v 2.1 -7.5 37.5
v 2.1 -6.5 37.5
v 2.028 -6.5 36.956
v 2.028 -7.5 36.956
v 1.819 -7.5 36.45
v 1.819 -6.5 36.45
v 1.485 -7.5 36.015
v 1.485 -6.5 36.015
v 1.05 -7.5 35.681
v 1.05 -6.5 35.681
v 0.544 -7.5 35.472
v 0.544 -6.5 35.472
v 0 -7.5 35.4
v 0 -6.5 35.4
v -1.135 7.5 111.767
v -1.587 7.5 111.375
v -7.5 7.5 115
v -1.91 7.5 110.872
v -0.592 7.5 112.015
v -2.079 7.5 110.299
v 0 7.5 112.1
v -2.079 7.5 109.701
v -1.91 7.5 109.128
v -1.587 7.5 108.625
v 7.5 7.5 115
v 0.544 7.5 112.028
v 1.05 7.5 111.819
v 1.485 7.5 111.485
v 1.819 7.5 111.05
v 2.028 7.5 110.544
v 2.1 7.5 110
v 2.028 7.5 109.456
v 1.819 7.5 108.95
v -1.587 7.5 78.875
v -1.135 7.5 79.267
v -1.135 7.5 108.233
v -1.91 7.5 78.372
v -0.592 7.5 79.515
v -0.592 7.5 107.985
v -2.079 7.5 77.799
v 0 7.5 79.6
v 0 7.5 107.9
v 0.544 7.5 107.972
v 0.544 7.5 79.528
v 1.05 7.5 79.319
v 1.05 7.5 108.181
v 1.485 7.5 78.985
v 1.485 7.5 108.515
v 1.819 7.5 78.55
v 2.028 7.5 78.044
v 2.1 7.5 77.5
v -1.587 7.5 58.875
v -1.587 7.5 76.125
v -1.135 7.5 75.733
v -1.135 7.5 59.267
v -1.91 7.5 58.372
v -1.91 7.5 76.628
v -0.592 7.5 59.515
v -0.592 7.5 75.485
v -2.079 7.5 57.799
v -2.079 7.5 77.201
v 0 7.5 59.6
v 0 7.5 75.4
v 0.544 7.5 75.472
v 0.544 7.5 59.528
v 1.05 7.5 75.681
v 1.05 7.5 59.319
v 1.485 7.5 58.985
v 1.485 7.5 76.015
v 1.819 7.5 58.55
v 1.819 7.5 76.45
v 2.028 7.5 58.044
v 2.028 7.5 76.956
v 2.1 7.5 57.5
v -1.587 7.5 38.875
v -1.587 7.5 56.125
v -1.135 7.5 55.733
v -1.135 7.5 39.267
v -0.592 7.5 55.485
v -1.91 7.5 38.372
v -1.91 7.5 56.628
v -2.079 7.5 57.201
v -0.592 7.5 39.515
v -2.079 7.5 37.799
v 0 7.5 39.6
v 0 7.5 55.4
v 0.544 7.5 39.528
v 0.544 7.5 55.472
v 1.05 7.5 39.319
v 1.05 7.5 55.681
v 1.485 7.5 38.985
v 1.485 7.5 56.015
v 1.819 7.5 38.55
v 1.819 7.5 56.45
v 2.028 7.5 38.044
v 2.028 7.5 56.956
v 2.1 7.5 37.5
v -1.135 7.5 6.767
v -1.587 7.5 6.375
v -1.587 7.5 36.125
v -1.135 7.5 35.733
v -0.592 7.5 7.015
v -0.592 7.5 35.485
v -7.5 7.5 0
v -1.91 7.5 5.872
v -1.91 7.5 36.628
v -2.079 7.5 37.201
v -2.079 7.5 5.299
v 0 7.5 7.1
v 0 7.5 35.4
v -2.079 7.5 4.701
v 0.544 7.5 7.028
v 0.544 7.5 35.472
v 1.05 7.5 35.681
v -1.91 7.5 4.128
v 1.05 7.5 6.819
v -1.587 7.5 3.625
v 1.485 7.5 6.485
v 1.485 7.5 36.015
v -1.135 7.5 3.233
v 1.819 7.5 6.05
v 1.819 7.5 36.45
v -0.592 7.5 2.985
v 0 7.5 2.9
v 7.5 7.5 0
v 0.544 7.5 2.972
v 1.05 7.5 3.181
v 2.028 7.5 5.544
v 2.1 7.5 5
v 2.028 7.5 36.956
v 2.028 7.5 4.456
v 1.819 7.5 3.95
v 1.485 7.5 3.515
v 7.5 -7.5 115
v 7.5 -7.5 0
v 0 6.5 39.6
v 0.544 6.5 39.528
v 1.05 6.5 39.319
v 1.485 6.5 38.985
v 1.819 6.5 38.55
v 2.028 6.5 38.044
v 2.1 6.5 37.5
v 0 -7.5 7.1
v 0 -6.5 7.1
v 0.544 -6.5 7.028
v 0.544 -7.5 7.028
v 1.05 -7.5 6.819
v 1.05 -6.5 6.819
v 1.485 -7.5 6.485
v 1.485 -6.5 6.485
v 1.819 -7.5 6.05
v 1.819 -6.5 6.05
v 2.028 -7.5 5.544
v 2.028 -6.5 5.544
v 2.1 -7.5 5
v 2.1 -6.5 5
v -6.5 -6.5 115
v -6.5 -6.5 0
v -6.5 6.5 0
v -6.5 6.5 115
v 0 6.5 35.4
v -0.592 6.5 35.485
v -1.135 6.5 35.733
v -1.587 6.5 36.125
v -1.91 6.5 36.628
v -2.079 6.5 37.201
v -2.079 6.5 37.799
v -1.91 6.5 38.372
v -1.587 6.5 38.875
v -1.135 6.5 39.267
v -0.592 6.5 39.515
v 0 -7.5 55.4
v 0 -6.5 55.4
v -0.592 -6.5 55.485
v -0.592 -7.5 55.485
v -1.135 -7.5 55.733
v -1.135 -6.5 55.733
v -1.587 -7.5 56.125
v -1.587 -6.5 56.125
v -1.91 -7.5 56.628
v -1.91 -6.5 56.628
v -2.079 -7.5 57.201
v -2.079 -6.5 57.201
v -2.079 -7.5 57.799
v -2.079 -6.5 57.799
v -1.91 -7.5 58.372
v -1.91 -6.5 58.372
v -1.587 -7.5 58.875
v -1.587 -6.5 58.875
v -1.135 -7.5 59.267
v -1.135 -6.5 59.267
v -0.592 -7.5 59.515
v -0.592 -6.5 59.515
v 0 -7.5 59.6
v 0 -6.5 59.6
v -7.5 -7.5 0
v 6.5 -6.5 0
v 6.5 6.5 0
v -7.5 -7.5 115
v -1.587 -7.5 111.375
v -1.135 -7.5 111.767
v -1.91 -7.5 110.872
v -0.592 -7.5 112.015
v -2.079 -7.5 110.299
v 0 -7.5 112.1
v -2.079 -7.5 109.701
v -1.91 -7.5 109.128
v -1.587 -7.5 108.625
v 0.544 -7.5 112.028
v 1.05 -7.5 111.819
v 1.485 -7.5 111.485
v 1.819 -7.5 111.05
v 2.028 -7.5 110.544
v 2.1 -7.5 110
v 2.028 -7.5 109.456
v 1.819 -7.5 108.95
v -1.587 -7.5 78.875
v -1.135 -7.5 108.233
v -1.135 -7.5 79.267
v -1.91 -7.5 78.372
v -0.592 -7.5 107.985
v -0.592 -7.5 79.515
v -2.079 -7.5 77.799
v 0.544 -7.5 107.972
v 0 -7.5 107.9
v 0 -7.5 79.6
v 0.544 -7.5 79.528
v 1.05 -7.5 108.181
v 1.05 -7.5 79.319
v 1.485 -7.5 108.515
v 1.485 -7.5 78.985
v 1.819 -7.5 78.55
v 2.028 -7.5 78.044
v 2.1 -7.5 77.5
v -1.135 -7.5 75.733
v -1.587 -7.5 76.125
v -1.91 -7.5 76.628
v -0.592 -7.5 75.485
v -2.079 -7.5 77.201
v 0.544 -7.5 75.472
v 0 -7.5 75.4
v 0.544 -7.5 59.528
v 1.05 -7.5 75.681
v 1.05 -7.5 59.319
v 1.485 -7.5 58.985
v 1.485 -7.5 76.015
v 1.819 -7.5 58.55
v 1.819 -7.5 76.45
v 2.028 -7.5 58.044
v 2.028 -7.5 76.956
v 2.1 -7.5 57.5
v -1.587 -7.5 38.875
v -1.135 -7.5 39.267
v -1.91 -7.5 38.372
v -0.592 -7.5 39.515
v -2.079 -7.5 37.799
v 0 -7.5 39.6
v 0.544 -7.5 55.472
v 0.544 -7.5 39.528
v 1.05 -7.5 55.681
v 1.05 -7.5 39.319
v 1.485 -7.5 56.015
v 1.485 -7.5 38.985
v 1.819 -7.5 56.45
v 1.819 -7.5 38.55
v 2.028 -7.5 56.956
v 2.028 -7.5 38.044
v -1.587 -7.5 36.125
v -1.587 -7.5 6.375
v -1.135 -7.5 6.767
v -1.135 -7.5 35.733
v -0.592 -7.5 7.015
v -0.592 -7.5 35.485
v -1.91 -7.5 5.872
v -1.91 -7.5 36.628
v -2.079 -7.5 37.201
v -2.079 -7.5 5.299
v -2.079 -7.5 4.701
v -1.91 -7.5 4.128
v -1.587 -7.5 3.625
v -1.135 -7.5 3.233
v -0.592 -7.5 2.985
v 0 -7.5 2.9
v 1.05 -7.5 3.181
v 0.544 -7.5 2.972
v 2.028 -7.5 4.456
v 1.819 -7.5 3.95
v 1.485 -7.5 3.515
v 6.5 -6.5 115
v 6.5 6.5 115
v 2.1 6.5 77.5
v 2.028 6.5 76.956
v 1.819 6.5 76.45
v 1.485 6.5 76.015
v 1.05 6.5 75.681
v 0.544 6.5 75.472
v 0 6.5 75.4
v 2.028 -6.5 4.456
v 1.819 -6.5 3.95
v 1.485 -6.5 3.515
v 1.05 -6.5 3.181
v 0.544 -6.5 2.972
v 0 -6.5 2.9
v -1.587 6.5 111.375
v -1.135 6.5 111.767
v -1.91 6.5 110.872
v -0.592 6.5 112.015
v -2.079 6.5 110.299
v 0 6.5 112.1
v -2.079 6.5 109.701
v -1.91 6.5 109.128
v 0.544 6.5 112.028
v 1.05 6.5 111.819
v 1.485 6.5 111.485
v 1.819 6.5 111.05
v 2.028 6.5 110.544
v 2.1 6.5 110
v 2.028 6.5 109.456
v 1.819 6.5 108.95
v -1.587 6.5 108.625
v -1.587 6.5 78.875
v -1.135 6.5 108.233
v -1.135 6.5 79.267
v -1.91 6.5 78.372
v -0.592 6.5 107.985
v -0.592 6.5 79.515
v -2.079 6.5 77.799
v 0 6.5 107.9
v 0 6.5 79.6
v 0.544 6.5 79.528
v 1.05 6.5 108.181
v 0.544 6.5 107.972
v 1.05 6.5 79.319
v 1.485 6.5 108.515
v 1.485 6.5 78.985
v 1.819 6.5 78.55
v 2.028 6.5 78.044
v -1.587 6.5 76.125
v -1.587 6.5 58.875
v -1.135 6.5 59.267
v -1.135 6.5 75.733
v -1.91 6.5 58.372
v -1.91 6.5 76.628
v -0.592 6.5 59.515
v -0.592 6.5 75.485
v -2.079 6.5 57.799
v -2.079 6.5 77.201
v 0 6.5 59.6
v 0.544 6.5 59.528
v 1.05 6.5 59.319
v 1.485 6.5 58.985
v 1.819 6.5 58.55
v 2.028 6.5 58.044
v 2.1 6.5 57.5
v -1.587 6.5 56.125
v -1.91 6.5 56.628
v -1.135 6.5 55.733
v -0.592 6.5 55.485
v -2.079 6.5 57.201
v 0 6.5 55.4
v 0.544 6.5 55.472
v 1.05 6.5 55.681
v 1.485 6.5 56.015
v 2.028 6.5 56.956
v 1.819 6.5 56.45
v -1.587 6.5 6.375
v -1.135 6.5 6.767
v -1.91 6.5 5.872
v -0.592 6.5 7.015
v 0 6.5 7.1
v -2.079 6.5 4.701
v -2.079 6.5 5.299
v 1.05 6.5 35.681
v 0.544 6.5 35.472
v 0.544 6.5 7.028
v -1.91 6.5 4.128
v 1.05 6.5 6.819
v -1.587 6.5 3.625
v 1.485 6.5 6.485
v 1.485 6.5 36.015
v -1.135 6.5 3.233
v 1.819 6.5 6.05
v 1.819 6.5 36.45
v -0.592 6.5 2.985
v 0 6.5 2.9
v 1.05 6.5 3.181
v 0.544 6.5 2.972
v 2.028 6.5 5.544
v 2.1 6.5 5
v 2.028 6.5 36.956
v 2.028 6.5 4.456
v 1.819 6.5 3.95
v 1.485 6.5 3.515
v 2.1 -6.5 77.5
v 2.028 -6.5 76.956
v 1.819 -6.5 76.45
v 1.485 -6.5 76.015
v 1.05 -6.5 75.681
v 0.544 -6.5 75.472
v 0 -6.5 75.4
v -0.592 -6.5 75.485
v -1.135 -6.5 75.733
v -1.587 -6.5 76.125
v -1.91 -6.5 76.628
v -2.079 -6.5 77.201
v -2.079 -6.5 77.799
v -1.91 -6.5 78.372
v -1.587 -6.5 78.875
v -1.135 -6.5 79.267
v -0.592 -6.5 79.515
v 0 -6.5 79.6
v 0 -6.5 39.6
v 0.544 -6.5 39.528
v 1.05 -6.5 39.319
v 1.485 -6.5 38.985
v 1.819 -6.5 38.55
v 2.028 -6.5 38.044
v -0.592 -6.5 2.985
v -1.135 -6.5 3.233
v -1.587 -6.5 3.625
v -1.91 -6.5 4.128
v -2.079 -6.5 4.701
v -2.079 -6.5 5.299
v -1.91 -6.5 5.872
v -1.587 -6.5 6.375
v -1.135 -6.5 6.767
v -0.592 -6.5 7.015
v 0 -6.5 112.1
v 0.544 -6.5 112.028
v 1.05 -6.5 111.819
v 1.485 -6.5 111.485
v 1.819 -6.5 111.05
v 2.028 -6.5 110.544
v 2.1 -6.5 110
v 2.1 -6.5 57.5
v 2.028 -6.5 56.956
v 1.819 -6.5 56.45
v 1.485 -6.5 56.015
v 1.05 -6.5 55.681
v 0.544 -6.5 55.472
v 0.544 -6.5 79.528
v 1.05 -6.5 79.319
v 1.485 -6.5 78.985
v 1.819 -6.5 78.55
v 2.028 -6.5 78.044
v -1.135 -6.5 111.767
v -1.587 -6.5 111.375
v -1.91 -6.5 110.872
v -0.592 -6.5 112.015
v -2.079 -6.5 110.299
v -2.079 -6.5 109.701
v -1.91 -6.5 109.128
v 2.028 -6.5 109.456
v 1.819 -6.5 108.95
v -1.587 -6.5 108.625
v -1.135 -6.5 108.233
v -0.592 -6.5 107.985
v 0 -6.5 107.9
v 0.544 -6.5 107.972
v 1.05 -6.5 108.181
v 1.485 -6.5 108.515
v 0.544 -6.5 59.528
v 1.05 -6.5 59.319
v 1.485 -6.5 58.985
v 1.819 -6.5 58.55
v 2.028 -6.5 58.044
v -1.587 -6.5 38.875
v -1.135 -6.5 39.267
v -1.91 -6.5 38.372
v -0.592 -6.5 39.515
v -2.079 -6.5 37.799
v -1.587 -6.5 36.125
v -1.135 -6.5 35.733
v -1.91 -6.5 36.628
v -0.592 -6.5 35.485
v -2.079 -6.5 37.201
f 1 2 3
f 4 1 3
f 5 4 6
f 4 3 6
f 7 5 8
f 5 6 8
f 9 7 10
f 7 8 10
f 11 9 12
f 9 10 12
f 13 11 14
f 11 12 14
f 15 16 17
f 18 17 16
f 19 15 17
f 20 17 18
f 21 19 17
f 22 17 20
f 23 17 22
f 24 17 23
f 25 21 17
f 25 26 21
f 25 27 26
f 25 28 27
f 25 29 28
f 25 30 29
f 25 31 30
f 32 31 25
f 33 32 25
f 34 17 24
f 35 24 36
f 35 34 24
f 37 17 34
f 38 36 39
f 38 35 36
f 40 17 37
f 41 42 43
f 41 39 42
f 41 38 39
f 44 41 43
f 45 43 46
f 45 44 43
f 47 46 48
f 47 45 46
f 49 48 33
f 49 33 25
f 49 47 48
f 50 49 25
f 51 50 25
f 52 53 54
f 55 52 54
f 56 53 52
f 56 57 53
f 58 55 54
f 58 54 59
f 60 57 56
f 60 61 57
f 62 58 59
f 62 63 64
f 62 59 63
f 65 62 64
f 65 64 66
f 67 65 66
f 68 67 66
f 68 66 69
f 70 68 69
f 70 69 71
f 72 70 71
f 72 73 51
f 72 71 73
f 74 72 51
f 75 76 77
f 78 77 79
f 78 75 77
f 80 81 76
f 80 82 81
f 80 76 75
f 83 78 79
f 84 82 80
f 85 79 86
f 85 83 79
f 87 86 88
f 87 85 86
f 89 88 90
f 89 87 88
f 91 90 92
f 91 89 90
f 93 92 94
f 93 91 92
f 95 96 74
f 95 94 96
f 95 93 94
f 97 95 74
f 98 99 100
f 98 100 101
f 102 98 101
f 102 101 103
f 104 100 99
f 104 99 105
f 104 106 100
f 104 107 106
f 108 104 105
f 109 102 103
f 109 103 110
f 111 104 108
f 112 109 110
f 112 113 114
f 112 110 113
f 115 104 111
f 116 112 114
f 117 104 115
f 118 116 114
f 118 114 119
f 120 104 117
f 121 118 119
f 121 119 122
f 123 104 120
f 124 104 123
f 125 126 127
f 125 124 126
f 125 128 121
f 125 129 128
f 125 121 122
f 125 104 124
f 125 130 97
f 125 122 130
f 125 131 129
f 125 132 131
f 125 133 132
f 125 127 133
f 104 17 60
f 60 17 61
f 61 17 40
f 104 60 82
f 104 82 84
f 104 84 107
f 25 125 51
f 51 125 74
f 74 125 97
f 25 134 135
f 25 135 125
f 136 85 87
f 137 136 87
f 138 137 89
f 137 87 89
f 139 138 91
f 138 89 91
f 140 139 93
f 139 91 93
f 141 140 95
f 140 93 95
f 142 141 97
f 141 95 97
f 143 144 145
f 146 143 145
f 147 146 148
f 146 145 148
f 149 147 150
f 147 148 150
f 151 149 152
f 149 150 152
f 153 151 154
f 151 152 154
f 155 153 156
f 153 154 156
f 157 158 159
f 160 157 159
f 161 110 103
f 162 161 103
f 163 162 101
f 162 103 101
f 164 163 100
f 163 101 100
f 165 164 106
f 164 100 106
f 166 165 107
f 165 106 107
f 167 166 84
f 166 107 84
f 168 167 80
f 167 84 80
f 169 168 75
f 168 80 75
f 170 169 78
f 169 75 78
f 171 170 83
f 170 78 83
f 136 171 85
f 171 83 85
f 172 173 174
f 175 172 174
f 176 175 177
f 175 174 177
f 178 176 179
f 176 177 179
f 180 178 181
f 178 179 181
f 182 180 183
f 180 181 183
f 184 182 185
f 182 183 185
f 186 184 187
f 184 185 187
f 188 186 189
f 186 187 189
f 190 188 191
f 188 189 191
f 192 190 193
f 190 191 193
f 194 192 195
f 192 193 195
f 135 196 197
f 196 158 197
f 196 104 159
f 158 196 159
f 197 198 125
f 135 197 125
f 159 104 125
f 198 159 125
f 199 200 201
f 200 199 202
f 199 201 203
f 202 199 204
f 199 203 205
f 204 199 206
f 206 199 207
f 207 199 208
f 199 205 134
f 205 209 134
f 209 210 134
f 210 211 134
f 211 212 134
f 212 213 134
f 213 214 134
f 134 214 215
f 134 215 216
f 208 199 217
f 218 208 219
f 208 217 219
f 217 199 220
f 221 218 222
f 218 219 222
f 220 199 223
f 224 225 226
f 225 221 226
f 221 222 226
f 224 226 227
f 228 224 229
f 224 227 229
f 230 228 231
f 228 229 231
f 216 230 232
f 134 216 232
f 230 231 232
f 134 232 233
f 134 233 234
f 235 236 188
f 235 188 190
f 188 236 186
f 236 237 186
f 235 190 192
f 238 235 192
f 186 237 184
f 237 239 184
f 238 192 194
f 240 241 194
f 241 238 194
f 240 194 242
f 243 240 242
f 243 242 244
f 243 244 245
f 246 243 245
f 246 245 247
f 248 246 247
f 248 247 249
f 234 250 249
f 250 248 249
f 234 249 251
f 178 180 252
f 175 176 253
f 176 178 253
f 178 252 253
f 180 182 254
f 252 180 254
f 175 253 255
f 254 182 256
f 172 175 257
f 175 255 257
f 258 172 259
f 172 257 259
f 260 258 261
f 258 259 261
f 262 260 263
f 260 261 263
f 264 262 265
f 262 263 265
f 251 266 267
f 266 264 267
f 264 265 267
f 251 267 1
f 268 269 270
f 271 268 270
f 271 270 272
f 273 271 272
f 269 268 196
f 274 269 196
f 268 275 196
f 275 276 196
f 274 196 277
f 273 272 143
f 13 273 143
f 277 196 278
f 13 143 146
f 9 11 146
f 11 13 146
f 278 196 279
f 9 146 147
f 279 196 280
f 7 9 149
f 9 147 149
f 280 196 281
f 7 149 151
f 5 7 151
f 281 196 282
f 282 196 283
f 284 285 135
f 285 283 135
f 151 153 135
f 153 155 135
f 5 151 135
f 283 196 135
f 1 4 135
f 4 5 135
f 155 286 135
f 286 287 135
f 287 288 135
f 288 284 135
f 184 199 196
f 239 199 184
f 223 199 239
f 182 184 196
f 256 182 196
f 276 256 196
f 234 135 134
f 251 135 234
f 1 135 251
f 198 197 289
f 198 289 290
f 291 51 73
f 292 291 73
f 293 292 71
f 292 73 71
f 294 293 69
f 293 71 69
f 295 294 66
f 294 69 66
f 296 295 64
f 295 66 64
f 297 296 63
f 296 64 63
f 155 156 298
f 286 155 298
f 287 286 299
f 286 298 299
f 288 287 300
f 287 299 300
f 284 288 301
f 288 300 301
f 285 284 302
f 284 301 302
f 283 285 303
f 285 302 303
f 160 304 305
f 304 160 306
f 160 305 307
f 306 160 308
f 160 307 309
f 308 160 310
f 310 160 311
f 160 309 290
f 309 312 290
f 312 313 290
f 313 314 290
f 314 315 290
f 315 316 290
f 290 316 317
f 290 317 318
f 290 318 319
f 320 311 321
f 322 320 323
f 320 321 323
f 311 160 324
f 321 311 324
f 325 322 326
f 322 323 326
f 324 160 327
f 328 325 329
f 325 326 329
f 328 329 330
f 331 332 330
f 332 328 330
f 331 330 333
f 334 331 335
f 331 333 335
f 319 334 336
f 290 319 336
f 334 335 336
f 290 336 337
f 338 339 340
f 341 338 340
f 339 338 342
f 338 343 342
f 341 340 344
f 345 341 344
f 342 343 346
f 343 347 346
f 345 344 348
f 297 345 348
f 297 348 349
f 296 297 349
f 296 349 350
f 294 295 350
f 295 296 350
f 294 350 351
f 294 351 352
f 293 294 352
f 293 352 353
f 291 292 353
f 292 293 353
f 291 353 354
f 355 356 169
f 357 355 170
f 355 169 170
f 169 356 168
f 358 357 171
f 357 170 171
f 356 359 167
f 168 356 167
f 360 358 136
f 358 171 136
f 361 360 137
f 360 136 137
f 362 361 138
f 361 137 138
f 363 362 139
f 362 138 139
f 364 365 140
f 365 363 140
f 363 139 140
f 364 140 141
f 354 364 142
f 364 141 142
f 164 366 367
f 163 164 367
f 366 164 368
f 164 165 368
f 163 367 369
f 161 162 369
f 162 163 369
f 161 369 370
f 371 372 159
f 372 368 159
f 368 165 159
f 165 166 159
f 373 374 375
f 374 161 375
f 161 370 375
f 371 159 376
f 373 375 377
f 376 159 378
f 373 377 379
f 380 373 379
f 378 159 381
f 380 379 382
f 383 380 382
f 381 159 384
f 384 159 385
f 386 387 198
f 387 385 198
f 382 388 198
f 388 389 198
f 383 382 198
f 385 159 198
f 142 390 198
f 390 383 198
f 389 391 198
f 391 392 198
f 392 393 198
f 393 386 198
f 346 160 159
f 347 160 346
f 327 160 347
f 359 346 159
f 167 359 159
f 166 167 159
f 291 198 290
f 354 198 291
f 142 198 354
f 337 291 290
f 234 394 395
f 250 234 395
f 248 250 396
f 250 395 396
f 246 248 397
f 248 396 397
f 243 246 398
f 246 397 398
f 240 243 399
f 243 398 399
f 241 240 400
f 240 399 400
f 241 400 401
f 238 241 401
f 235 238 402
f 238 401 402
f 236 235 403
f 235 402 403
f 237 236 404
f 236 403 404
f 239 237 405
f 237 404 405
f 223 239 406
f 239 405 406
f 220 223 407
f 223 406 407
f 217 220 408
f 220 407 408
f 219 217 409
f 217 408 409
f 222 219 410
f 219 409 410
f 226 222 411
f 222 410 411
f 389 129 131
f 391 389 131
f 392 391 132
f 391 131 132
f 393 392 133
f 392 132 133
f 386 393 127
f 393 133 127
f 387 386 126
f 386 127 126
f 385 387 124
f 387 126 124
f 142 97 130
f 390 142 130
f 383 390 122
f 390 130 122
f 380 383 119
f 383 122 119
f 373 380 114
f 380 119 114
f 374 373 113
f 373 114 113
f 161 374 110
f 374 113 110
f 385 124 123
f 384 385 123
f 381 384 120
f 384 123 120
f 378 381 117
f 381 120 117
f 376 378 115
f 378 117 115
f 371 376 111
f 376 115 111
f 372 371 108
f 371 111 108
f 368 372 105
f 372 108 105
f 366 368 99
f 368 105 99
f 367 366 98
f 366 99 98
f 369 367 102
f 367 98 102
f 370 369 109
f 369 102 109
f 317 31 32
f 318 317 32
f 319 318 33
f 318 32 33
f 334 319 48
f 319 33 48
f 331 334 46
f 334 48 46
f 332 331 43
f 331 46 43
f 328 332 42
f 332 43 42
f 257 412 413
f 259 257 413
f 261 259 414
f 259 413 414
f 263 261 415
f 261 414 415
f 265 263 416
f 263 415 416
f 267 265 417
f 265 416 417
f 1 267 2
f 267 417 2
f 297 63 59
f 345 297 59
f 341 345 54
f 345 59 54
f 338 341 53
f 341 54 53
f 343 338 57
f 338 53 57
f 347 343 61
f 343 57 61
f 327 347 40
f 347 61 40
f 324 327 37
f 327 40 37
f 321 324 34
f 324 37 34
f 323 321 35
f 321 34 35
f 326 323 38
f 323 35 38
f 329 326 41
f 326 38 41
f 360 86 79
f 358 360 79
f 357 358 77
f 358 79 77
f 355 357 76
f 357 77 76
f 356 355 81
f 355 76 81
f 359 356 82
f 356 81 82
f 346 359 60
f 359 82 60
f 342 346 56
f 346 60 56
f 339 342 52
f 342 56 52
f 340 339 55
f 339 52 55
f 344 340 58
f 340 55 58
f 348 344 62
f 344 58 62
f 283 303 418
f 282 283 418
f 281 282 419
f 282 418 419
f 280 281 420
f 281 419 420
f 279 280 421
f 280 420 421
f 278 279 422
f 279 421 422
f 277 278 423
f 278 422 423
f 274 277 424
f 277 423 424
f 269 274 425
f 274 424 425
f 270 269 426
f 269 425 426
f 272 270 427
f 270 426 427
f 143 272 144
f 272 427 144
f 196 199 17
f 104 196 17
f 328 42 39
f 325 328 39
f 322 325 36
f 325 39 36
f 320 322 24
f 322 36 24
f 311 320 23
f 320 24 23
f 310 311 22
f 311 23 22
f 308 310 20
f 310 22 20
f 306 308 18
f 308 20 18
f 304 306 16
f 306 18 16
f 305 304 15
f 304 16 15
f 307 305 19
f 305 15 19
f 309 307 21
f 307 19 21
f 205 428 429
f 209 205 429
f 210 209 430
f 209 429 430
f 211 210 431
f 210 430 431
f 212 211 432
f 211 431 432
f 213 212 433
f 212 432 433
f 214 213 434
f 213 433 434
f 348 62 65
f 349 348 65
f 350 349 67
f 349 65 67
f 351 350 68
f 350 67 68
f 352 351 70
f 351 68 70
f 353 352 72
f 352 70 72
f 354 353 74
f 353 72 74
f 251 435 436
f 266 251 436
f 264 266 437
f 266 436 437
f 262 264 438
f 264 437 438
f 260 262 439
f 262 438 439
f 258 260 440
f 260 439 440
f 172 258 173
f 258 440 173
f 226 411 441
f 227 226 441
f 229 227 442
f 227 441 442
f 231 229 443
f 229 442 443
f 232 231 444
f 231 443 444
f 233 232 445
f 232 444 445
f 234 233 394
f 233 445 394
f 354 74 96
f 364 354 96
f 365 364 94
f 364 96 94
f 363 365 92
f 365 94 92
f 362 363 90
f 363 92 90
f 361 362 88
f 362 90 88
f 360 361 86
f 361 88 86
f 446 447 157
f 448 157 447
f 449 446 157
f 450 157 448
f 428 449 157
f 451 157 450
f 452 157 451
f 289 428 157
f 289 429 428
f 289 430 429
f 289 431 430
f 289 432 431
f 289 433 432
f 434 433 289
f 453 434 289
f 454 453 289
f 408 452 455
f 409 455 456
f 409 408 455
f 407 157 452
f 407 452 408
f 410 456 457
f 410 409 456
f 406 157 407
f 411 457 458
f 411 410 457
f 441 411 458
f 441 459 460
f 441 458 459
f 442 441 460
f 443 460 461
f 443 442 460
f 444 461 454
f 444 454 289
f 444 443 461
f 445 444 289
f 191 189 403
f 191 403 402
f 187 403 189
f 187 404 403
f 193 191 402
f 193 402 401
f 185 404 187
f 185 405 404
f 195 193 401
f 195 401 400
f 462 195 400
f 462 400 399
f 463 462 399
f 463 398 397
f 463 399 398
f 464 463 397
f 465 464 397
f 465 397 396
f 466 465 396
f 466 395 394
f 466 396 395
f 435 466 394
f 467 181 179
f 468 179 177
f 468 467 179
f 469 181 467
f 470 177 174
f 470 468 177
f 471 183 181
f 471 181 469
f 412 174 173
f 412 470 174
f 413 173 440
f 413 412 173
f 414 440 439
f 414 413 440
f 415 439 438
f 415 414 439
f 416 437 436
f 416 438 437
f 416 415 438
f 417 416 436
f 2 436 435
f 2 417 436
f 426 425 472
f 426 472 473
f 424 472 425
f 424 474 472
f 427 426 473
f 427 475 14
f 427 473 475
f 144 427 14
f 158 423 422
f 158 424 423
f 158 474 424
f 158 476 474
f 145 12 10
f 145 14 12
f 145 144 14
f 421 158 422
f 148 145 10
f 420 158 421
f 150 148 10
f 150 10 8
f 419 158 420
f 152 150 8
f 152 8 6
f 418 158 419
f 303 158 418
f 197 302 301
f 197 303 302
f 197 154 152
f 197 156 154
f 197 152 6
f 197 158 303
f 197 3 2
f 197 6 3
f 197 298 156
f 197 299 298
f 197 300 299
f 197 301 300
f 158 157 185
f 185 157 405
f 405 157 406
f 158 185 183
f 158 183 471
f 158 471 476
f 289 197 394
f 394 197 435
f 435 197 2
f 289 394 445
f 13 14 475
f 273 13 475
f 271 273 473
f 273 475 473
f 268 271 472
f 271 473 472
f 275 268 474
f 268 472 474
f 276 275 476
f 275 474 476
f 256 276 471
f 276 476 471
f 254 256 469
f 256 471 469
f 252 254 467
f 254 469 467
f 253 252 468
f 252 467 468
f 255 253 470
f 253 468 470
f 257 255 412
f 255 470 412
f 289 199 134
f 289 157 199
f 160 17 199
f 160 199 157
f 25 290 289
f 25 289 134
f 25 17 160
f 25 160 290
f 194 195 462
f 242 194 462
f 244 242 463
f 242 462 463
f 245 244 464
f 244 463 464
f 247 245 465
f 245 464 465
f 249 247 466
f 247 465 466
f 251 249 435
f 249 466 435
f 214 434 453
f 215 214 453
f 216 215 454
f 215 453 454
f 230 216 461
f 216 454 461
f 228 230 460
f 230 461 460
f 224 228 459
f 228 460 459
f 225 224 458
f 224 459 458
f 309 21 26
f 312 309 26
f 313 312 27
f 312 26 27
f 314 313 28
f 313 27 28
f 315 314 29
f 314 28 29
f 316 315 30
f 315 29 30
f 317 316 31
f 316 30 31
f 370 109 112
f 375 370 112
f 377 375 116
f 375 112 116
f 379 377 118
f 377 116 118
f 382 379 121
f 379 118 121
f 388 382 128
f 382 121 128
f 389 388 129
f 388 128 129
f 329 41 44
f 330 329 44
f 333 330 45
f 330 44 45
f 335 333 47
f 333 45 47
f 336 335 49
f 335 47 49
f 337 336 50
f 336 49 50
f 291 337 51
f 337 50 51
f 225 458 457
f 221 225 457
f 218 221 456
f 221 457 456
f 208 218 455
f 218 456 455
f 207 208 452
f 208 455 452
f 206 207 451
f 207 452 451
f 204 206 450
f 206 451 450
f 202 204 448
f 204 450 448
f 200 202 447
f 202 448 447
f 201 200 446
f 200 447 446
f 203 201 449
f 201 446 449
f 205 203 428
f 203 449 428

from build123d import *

# Parameters (mm, degrees)
SKETCH_1_W          = 15
SKETCH_1_H          = 15
SKETCH_1_W_2        = 13
SKETCH_1_H_2        = 13
EXTRUDE_1_DEPTH     = 115
CUT_EXTRUDE_1_DEPTH = 117.216392992


with BuildPart() as part:
    # ｽｹｯﾁ1 → 押し出し-薄板1 (new body)
    with BuildSketch(Plane.XY):
        Rectangle(SKETCH_1_W, SKETCH_1_H)
        Rectangle(SKETCH_1_W_2, SKETCH_1_H_2, mode=Mode.SUBTRACT)
    extrude(amount=EXTRUDE_1_DEPTH)

    # ｽｹｯﾁ2 → ｶｯﾄ - 押し出し1 (cut, through all)
    with BuildSketch(Plane(origin=(0, 7.5, 0), x_dir=(1, 0, 0), z_dir=(0, 1, 0))):
        with BuildLine():
            ThreePointArc((2.1, -110), (1.48492424, -108.51507576), (0, -107.9))
            Line((0, -107.9), (0, -112.1))
            ThreePointArc((0, -112.1), (1.48492424, -111.48492424), (2.1, -110))
        make_face()
        with BuildLine():
            Line((0, -112.1), (0, -107.9))
            ThreePointArc((0, -107.9), (-2.1, -110), (0, -112.1))
        make_face()
        with BuildLine():
            ThreePointArc((2.1, -77.5), (1.48492424, -76.01507576), (0, -75.4))
            Line((0, -75.4), (0, -79.6))
            ThreePointArc((0, -79.6), (1.48492424, -78.98492424), (2.1, -77.5))
        make_face()
        with BuildLine():
            Line((0, -79.6), (0, -75.4))
            ThreePointArc((0, -75.4), (-2.1, -77.5), (0, -79.6))
        make_face()
        with BuildLine():
            Line((0, -57.5), (0, -55.4))
            ThreePointArc((0, -55.4), (-2.1, -57.5), (0, -59.6))
            Line((0, -59.6), (0, -57.5))
        make_face()
        with BuildLine():
            ThreePointArc((2.1, -57.5), (1.48492424, -56.01507576), (0, -55.4))
            Line((0, -55.4), (0, -57.5))
            Line((0, -57.5), (2.1, -57.5))
        make_face()
        with BuildLine():
            Line((2.1, -57.5), (0, -57.5))
            Line((0, -57.5), (0, -59.6))
            ThreePointArc((0, -59.6), (1.48492424, -58.98492424), (2.1, -57.5))
        make_face()
        with BuildLine():
            ThreePointArc((2.1, -37.5), (1.48492424, -36.01507576), (0, -35.4))
            Line((0, -35.4), (0, -39.6))
            ThreePointArc((0, -39.6), (1.48492424, -38.98492424), (2.1, -37.5))
        make_face()
        with BuildLine():
            Line((0, -39.6), (0, -35.4))
            ThreePointArc((0, -35.4), (-2.1, -37.5), (0, -39.6))
        make_face()
        with BuildLine():
            ThreePointArc((2.1, -5), (1.48492424, -3.51507576), (0, -2.9))
            Line((0, -2.9), (0, -7.1))
            ThreePointArc((0, -7.1), (1.48492424, -6.48492424), (2.1, -5))
        make_face()
        with BuildLine():
            Line((0, -7.1), (0, -2.9))
            ThreePointArc((0, -2.9), (-2.1, -5), (0, -7.1))
        make_face()
    extrude(amount=-CUT_EXTRUDE_1_DEPTH, mode=Mode.SUBTRACT)


solid = part.part
